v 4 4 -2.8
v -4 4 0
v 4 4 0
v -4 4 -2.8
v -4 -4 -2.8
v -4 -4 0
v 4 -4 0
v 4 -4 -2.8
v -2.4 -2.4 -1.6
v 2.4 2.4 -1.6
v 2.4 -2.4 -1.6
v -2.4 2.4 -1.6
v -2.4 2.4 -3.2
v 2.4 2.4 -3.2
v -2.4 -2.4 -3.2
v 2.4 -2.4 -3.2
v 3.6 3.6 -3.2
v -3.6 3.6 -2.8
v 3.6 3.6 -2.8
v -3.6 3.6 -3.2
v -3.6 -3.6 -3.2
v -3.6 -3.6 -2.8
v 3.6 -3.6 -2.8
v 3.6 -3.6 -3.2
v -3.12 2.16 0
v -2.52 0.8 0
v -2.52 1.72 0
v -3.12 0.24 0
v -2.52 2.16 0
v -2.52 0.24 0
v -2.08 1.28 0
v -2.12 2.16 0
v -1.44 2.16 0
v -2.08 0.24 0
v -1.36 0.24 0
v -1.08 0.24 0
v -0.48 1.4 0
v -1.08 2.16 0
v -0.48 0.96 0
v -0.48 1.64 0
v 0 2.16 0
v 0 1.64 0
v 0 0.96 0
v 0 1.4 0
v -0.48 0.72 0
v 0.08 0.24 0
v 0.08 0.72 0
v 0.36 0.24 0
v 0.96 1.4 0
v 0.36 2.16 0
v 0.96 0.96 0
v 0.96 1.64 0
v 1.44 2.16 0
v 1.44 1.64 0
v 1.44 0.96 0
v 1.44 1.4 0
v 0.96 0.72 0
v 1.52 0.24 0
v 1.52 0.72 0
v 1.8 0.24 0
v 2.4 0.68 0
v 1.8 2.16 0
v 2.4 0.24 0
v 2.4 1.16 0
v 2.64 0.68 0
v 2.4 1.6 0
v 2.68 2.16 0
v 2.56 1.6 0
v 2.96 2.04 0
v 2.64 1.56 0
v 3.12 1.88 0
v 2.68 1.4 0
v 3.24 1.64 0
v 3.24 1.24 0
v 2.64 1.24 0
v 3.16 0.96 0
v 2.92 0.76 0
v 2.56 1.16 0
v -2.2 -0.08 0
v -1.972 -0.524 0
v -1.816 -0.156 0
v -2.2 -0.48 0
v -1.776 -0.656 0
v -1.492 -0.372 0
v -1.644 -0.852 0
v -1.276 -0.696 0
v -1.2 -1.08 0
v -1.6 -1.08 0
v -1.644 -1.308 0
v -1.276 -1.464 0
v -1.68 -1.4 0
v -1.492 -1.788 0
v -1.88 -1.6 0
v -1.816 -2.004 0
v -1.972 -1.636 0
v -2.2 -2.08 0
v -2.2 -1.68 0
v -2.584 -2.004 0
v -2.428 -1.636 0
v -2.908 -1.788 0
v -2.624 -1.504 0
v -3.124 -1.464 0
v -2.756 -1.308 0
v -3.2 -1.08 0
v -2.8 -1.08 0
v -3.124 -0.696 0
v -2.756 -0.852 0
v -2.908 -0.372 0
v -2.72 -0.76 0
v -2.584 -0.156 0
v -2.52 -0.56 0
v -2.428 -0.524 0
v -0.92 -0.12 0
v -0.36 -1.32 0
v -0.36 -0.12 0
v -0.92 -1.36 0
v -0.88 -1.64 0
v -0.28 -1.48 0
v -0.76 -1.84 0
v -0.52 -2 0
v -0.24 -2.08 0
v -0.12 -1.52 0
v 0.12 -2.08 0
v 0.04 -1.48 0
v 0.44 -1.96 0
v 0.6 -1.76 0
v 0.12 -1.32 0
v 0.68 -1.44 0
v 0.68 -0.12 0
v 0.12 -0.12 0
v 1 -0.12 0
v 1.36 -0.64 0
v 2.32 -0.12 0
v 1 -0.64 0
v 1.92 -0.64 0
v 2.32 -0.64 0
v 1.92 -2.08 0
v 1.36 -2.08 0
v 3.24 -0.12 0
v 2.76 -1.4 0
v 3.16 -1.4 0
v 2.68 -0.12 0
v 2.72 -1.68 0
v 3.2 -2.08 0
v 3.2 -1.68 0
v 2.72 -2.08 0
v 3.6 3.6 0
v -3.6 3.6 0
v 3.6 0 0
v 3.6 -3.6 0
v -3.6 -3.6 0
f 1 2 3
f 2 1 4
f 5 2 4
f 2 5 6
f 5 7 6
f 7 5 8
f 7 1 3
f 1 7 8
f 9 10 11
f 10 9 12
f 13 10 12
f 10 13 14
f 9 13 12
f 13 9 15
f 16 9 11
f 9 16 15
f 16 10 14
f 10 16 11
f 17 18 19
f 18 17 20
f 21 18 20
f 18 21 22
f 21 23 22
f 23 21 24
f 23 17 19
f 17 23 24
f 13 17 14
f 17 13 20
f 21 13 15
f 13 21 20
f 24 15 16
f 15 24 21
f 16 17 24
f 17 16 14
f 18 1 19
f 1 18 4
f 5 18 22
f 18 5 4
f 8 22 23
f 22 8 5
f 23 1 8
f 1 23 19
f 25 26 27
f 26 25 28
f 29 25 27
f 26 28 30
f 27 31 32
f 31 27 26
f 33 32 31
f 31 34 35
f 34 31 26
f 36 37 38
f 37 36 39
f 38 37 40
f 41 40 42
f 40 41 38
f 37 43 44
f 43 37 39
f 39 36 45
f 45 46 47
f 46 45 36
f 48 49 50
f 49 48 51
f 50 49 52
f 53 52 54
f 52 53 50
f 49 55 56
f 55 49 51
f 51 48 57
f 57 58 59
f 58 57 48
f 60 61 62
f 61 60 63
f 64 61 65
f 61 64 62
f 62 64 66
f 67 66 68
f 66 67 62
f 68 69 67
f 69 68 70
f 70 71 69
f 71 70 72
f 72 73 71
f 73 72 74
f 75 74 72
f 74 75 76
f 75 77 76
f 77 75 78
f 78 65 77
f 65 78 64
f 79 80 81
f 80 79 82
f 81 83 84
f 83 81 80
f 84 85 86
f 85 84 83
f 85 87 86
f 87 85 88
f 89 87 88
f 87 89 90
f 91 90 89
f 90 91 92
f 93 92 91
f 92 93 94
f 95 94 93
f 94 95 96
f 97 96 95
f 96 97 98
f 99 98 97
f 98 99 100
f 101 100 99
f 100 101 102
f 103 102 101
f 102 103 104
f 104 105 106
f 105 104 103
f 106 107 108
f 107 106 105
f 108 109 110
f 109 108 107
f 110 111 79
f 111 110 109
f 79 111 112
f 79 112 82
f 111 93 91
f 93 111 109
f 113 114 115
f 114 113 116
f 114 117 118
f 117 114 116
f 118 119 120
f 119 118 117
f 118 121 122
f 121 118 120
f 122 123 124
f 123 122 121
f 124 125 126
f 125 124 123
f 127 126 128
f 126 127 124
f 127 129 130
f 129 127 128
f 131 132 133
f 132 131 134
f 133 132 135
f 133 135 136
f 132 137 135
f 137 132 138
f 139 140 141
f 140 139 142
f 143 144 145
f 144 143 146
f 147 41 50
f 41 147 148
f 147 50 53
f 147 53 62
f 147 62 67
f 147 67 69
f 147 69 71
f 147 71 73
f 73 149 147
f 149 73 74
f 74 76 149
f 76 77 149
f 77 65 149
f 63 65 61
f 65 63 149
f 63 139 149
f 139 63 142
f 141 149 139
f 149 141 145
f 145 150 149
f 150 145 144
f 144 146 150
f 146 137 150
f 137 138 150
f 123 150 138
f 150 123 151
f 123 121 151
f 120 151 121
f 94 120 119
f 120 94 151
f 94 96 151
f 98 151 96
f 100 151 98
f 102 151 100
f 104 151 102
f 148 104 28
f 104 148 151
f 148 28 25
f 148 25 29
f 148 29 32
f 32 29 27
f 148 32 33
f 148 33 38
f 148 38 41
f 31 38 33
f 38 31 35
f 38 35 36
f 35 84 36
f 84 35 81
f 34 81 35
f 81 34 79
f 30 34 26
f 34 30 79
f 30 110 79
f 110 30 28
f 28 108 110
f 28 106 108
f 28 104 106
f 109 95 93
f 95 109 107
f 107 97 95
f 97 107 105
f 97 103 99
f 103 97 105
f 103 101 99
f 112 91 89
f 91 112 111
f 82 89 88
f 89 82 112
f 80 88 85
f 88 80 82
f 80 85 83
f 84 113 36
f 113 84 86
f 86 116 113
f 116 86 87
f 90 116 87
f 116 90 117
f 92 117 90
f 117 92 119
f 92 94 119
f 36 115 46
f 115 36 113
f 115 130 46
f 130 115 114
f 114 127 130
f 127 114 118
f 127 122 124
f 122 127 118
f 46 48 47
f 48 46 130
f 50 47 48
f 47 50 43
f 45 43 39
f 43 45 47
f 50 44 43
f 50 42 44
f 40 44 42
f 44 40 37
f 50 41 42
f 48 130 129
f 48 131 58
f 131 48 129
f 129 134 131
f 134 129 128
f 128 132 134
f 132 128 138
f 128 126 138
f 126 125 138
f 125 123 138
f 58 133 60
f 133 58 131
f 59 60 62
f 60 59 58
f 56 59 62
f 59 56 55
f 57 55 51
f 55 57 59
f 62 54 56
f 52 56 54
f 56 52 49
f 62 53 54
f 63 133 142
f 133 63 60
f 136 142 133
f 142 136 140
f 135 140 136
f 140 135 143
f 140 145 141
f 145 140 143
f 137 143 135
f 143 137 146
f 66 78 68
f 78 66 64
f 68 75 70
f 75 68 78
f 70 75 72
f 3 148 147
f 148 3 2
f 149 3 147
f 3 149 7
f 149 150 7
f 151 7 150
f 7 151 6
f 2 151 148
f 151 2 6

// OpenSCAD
// file: ../p/box5.scad
use <../lib.scad>
function ldraw_lib__box5() = [
// 0 Box with 5 Faces and All Edges
// 0 Name: box5.dat
// 0 Author: James Jessiman
// 0 !LDRAW_ORG Primitive UPDATE 2012-01
// 0 !LICENSE Licensed under CC BY 4.0 : see CAreadme.txt
// 
// 0 BFC CERTIFY CCW
  [0,"BFC","CERTIFY"],
  [0,"BFC","CCW"],
// 
// 0 !HISTORY 2002-04-03 [sbliss] Modified for BFC compliance
// 0 !HISTORY 2002-04-25 [PTadmin] Official Update 2002-02
// 0 !HISTORY 2007-06-24 [PTadmin] Header formatted for Contributor Agreement
// 0 !HISTORY 2008-07-01 [PTadmin] Official Update 2008-01
// 0 !HISTORY 2012-02-16 [Philo] Changed to CCW
// 0 !HISTORY 2012-03-30 [PTadmin] Official Update 2012-01
// 
// 
// 2 24 1 1 1 -1 1 1
  [2,24,1,1,1,-1,1,1],
// 2 24 -1 1 1 -1 1 -1
  [2,24,-1,1,1,-1,1,-1],
// 2 24 -1 1 -1 1 1 -1
  [2,24,-1,1,-1,1,1,-1],
// 2 24 1 1 -1 1 1 1
  [2,24,1,1,-1,1,1,1],
// 2 24 1 0 1 -1 0 1
  [2,24,1,0,1,-1,0,1],
// 2 24 -1 0 1 -1 0 -1
  [2,24,-1,0,1,-1,0,-1],
// 2 24 -1 0 -1 1 0 -1
  [2,24,-1,0,-1,1,0,-1],
// 2 24 1 0 -1 1 0 1
  [2,24,1,0,-1,1,0,1],
// 2 24 1 0 1 1 1 1
  [2,24,1,0,1,1,1,1],
// 2 24 -1 0 1 -1 1 1
  [2,24,-1,0,1,-1,1,1],
// 2 24 1 0 -1 1 1 -1
  [2,24,1,0,-1,1,1,-1],
// 2 24 -1 0 -1 -1 1 -1
  [2,24,-1,0,-1,-1,1,-1],
// 4 16 -1 1 1 1 1 1 1 1 -1 -1 1 -1
  [4,16,-1,1,1,1,1,1,1,1,-1,-1,1,-1],
// 4 16 -1 1 1 -1 0 1 1 0 1 1 1 1
  [4,16,-1,1,1,-1,0,1,1,0,1,1,1,1],
// 4 16 -1 1 -1 -1 0 -1 -1 0 1 -1 1 1
  [4,16,-1,1,-1,-1,0,-1,-1,0,1,-1,1,1],
// 4 16 1 1 -1 1 0 -1 -1 0 -1 -1 1 -1
  [4,16,1,1,-1,1,0,-1,-1,0,-1,-1,1,-1],
// 4 16 1 1 1 1 0 1 1 0 -1 1 1 -1
  [4,16,1,1,1,1,0,1,1,0,-1,1,1,-1],
];
module ldraw_lib__box5(step=0, col=false, unit=2/5, alt=false, line=0.2, solid=!$preview)
    makepoly(ldraw_lib__box5(), step=step, col=col, unit=unit, alt=alt, line=line, solid=solid);
ldraw_lib__box5(line=0.2);
// file: ../p/box4.scad
use <../lib.scad>
function ldraw_lib__box4() = [
// 0 Box with 4 Faces (2 Parallel Pairs) and All Edges
// 0 Name: box4.dat
// 0 Author: James Jessiman
// 0 !LDRAW_ORG Primitive UPDATE 2012-01
// 0 !LICENSE Licensed under CC BY 4.0 : see CAreadme.txt
// 
// 0 BFC CERTIFY CCW
  [0,"BFC","CERTIFY"],
  [0,"BFC","CCW"],
// 
// 0 !HISTORY 2002-04-03 [sbliss] Modified for BFC compliance
// 0 !HISTORY 2002-04-25 [PTadmin] Official Update 2002-02
// 0 !HISTORY 2007-06-24 [PTadmin] Header formatted for Contributor Agreement
// 0 !HISTORY 2008-07-01 [PTadmin] Official Update 2008-01
// 0 !HISTORY 2012-02-16 [Philo] Changed to CCW
// 0 !HISTORY 2012-03-30 [PTadmin] Official Update 2012-01
// 
// 
// 2 24 1 1 1 -1 1 1
  [2,24,1,1,1,-1,1,1],
// 2 24 -1 1 1 -1 1 -1
  [2,24,-1,1,1,-1,1,-1],
// 2 24 -1 1 -1 1 1 -1
  [2,24,-1,1,-1,1,1,-1],
// 2 24 1 1 -1 1 1 1
  [2,24,1,1,-1,1,1,1],
// 2 24 1 0 1 -1 0 1
  [2,24,1,0,1,-1,0,1],
// 2 24 -1 0 1 -1 0 -1
  [2,24,-1,0,1,-1,0,-1],
// 2 24 -1 0 -1 1 0 -1
  [2,24,-1,0,-1,1,0,-1],
// 2 24 1 0 -1 1 0 1
  [2,24,1,0,-1,1,0,1],
// 2 24 1 0 1 1 1 1
  [2,24,1,0,1,1,1,1],
// 2 24 -1 0 1 -1 1 1
  [2,24,-1,0,1,-1,1,1],
// 2 24 1 0 -1 1 1 -1
  [2,24,1,0,-1,1,1,-1],
// 2 24 -1 0 -1 -1 1 -1
  [2,24,-1,0,-1,-1,1,-1],
// 4 16 -1 1 1 -1 0 1 1 0 1 1 1 1
  [4,16,-1,1,1,-1,0,1,1,0,1,1,1,1],
// 4 16 -1 1 -1 -1 0 -1 -1 0 1 -1 1 1
  [4,16,-1,1,-1,-1,0,-1,-1,0,1,-1,1,1],
// 4 16 1 1 -1 1 0 -1 -1 0 -1 -1 1 -1
  [4,16,1,1,-1,1,0,-1,-1,0,-1,-1,1,-1],
// 4 16 1 1 1 1 0 1 1 0 -1 1 1 -1
  [4,16,1,1,1,1,0,1,1,0,-1,1,1,-1],
];
module ldraw_lib__box4(step=0, col=false, unit=2/5, alt=false, line=0.2, solid=!$preview)
    makepoly(ldraw_lib__box4(), step=step, col=col, unit=unit, alt=alt, line=line, solid=solid);
ldraw_lib__box4(line=0.2);
// file: s/3070bs01.scad
use <../../lib.scad>
use <../../p/box4.scad>
use <../../p/box5.scad>
function ldraw_lib__s__3070bs01() = [
// 0 ~Tile  1 x  1 with Groove without Top Face
// 0 Name: s\3070bs01.dat
// 0 Author: Chris Dee [cwdee]
// 0 !LDRAW_ORG Subpart UPDATE 2009-02
// 0 !LICENSE Licensed under CC BY 4.0 : see CAreadme.txt
// 
// 0 BFC CERTIFY CCW
  [0,"BFC","CERTIFY"],
  [0,"BFC","CCW"],
// 
// 0 !HISTORY 2009-09-03 [PTadmin] Official Update 2009-02
// 
// 
// 1 16 0 0 0 10 0 0 0 7 0 0 0 10 box4.dat
  [1,16,0,0,0,10,0,0,0,7,0,0,0,10, ldraw_lib__box4()],
// 0 BFC INVERTNEXT
  [0,"BFC","INVERTNEXT"],
// 1 16 0 8 0 6 0 0 0 -4 0 0 0 6 box5.dat
  [1,16,0,8,0,6,0,0,0,-4,0,0,0,6, ldraw_lib__box5()],
// 1 16 0 7 0 9 0 0 0 1 0 0 0 9 box4.dat
  [1,16,0,7,0,9,0,0,0,1,0,0,0,9, ldraw_lib__box4()],
// 
// 4 16 9 8 9 6 8 6 -6 8 6 -9 8 9
  [4,16,9,8,9,6,8,6,-6,8,6,-9,8,9],
// 4 16 -9 8 9 -6 8 6 -6 8 -6 -9 8 -9
  [4,16,-9,8,9,-6,8,6,-6,8,-6,-9,8,-9],
// 4 16 -9 8 -9 -6 8 -6 6 8 -6 9 8 -9
  [4,16,-9,8,-9,-6,8,-6,6,8,-6,9,8,-9],
// 4 16 9 8 -9 6 8 -6 6 8 6 9 8 9
  [4,16,9,8,-9,6,8,-6,6,8,6,9,8,9],
// 
// 4 16 10 7 10 9 7 9 -9 7 9 -10 7 10
  [4,16,10,7,10,9,7,9,-9,7,9,-10,7,10],
// 4 16 -10 7 10 -9 7 9 -9 7 -9 -10 7 -10
  [4,16,-10,7,10,-9,7,9,-9,7,-9,-10,7,-10],
// 4 16 -10 7 -10 -9 7 -9 9 7 -9 10 7 -10
  [4,16,-10,7,-10,-9,7,-9,9,7,-9,10,7,-10],
// 4 16 10 7 -10 9 7 -9 9 7 9 10 7 10
  [4,16,10,7,-10,9,7,-9,9,7,9,10,7,10],
// 0
];
module ldraw_lib__s__3070bs01(step=0, col=false, unit=2/5, alt=false, line=0.2, solid=!$preview)
    makepoly(ldraw_lib__s__3070bs01(), step=step, col=col, unit=unit, alt=alt, line=line, solid=solid);
ldraw_lib__s__3070bs01(line=0.2);
// main file
use <../lib.scad>
use <s/3070bs01.scad>
function ldraw_lib__3070bpt3() = [
// 0 Tile  1 x  1 with Bright Pink "KEEP OUT!" on Magenta Background Pattern
// 0 Name: 3070bpt3.dat
// 0 Author: Takeshi Takahashi [RainbowDolphin]
// 0 !LDRAW_ORG Part UPDATE 2025-11
// 0 !LICENSE Licensed under CC BY 4.0 : see CAreadme.txt
// 
// 0 BFC CERTIFY CCW
  [0,"BFC","CERTIFY"],
  [0,"BFC","CCW"],
// 
// 0 !KEYWORDS BrickLink 3070pb185, Brickowl 282991, Dots, Extra
// 0 !KEYWORDS Rebrickable 3070bpr9980, Series 3, Set 41921
// 
// 0 !HISTORY 2025-11-30 [OrionP] Official Update 2025-11
// 
// 1 16 0 0 0 1 0 0 0 1 0 0 0 1 s\3070bs01.dat
  [1,16,0,0,0,1,0,0,0,1,0,0,0,1, ldraw_lib__s__3070bs01()],
// 4 29 -7.8 0 5.4 -7.8 0 0.6 -6.3 0 2 -6.3 0 4.3
  [4,29,-7.8,0,5.4,-7.8,0,0.6,-6.3,0,2,-6.3,0,4.3],
// 3 29 -6.3 0 5.4 -7.8 0 5.4 -6.3 0 4.3
  [3,29,-6.3,0,5.4,-7.8,0,5.4,-6.3,0,4.3],
// 3 29 -6.3 0 2 -7.8 0 0.6 -6.3 0 0.6
  [3,29,-6.3,0,2,-7.8,0,0.6,-6.3,0,0.6],
// 4 29 -6.3 0 4.3 -6.3 0 2 -5.2 0 3.2 -5.3 0 5.4
  [4,29,-6.3,0,4.3,-6.3,0,2,-5.2,0,3.2,-5.3,0,5.4],
// 3 29 -3.6 0 5.4 -5.3 0 5.4 -5.2 0 3.2
  [3,29,-3.6,0,5.4,-5.3,0,5.4,-5.2,0,3.2],
// 4 29 -5.2 0 3.2 -6.3 0 2 -5.2 0 0.6 -3.4 0 0.6
  [4,29,-5.2,0,3.2,-6.3,0,2,-5.2,0,0.6,-3.4,0,0.6],
// 4 29 -2.7 0 5.4 -2.7 0 0.6 -1.2 0 2.4 -1.2 0 3.5
  [4,29,-2.7,0,5.4,-2.7,0,0.6,-1.2,0,2.4,-1.2,0,3.5],
// 3 29 -2.7 0 5.4 -1.2 0 3.5 -1.2 0 4.1
  [3,29,-2.7,0,5.4,-1.2,0,3.5,-1.2,0,4.1],
// 4 29 0 0 5.4 -2.7 0 5.4 -1.2 0 4.1 0 0 4.1
  [4,29,0,0,5.4,-2.7,0,5.4,-1.2,0,4.1,0,0,4.1],
// 4 29 0 0 3.5 -1.2 0 3.5 -1.2 0 2.4 0 0 2.4
  [4,29,0,0,3.5,-1.2,0,3.5,-1.2,0,2.4,0,0,2.4],
// 3 29 -1.2 0 2.4 -2.7 0 0.6 -1.2 0 1.8
  [3,29,-1.2,0,2.4,-2.7,0,0.6,-1.2,0,1.8],
// 4 29 -1.2 0 1.8 -2.7 0 0.6 0.2 0 0.6 0.2 0 1.8
  [4,29,-1.2,0,1.8,-2.7,0,0.6,0.2,0,0.6,0.2,0,1.8],
// 4 29 0.9 0 5.4 0.9 0 0.6 2.4 0 2.4 2.4 0 3.5
  [4,29,0.9,0,5.4,0.9,0,0.6,2.4,0,2.4,2.4,0,3.5],
// 3 29 0.9 0 5.4 2.4 0 3.5 2.4 0 4.1
  [3,29,0.9,0,5.4,2.4,0,3.5,2.4,0,4.1],
// 4 29 3.6 0 5.4 0.9 0 5.4 2.4 0 4.1 3.6 0 4.1
  [4,29,3.6,0,5.4,0.9,0,5.4,2.4,0,4.1,3.6,0,4.1],
// 4 29 3.6 0 3.5 2.4 0 3.5 2.4 0 2.4 3.6 0 2.4
  [4,29,3.6,0,3.5,2.4,0,3.5,2.4,0,2.4,3.6,0,2.4],
// 3 29 2.4 0 2.4 0.9 0 0.6 2.4 0 1.8
  [3,29,2.4,0,2.4,0.9,0,0.6,2.4,0,1.8],
// 4 29 2.4 0 1.8 0.9 0 0.6 3.8 0 0.6 3.8 0 1.8
  [4,29,2.4,0,1.8,0.9,0,0.6,3.8,0,0.6,3.8,0,1.8],
// 4 29 6 0 1.7 4.5 0 5.4 4.5 0 0.6 6 0 0.6
  [4,29,6,0,1.7,4.5,0,5.4,4.5,0,0.6,6,0,0.6],
// 4 29 6 0 2.9 4.5 0 5.4 6 0 1.7 6.6 0 1.7
  [4,29,6,0,2.9,4.5,0,5.4,6,0,1.7,6.6,0,1.7],
// 3 29 4.5 0 5.4 6 0 2.9 6 0 4
  [3,29,4.5,0,5.4,6,0,2.9,6,0,4],
// 4 29 6.7 0 5.4 4.5 0 5.4 6 0 4 6.4 0 4
  [4,29,6.7,0,5.4,4.5,0,5.4,6,0,4,6.4,0,4],
// 4 29 7.4 0 5.1 6.7 0 5.4 6.4 0 4 6.6 0 3.9
  [4,29,7.4,0,5.1,6.7,0,5.4,6.4,0,4,6.6,0,3.9],
// 4 29 7.8 0 4.7 7.4 0 5.1 6.6 0 3.9 6.7 0 3.5
  [4,29,7.8,0,4.7,7.4,0,5.1,6.6,0,3.9,6.7,0,3.5],
// 4 29 8.1 0 4.1 7.8 0 4.7 6.7 0 3.5 8.1 0 3.1
  [4,29,8.1,0,4.1,7.8,0,4.7,6.7,0,3.5,8.1,0,3.1],
// 4 29 8.1 0 3.1 6.7 0 3.5 6.6 0 3.1 7.9 0 2.4
  [4,29,8.1,0,3.1,6.7,0,3.5,6.6,0,3.1,7.9,0,2.4],
// 4 29 7.9 0 2.4 6.6 0 3.1 6.4 0 2.9 7.3 0 1.9
  [4,29,7.9,0,2.4,6.6,0,3.1,6.4,0,2.9,7.3,0,1.9],
// 4 29 6.6 0 1.7 7.3 0 1.9 6.4 0 2.9 6 0 2.9
  [4,29,6.6,0,1.7,7.3,0,1.9,6.4,0,2.9,6,0,2.9],
// 4 29 -4.54 0 -0.39 -5.5 0 -0.2 -5.5 0 -1.2 -4.93 0 -1.31
  [4,29,-4.54,0,-0.39,-5.5,0,-0.2,-5.5,0,-1.2,-4.93,0,-1.31],
// 4 29 -3.73 0 -0.93 -4.54 0 -0.39 -4.93 0 -1.31 -4.44 0 -1.64
  [4,29,-3.73,0,-0.93,-4.54,0,-0.39,-4.93,0,-1.31,-4.44,0,-1.64],
// 4 29 -3.19 0 -1.74 -3.73 0 -0.93 -4.44 0 -1.64 -4.11 0 -2.13
  [4,29,-3.19,0,-1.74,-3.73,0,-0.93,-4.44,0,-1.64,-4.11,0,-2.13],
// 4 29 -3 0 -2.7 -3.19 0 -1.74 -4.11 0 -2.13 -4 0 -2.7
  [4,29,-3,0,-2.7,-3.19,0,-1.74,-4.11,0,-2.13,-4,0,-2.7],
// 4 29 -3.19 0 -3.66 -3 0 -2.7 -4 0 -2.7 -4.11 0 -3.27
  [4,29,-3.19,0,-3.66,-3,0,-2.7,-4,0,-2.7,-4.11,0,-3.27],
// 4 29 -3.73 0 -4.47 -3.19 0 -3.66 -4.11 0 -3.27 -4.2 0 -3.5
  [4,29,-3.73,0,-4.47,-3.19,0,-3.66,-4.11,0,-3.27,-4.2,0,-3.5],
// 4 29 -4.54 0 -5.01 -3.73 0 -4.47 -4.2 0 -3.5 -4.7 0 -4
  [4,29,-4.54,0,-5.01,-3.73,0,-4.47,-4.2,0,-3.5,-4.7,0,-4],
// 4 29 -5.5 0 -5.2 -4.54 0 -5.01 -4.7 0 -4 -4.93 0 -4.09
  [4,29,-5.5,0,-5.2,-4.54,0,-5.01,-4.7,0,-4,-4.93,0,-4.09],
// 4 29 -5.5 0 -5.2 -4.93 0 -4.09 -5.5 0 -4.2 -6.46 0 -5.01
  [4,29,-5.5,0,-5.2,-4.93,0,-4.09,-5.5,0,-4.2,-6.46,0,-5.01],
// 4 29 -6.46 0 -5.01 -5.5 0 -4.2 -6.07 0 -4.09 -7.27 0 -4.47
  [4,29,-6.46,0,-5.01,-5.5,0,-4.2,-6.07,0,-4.09,-7.27,0,-4.47],
// 4 29 -7.27 0 -4.47 -6.07 0 -4.09 -6.56 0 -3.76 -7.81 0 -3.66
  [4,29,-7.27,0,-4.47,-6.07,0,-4.09,-6.56,0,-3.76,-7.81,0,-3.66],
// 4 29 -7.81 0 -3.66 -6.56 0 -3.76 -6.89 0 -3.27 -8 0 -2.7
  [4,29,-7.81,0,-3.66,-6.56,0,-3.76,-6.89,0,-3.27,-8,0,-2.7],
// 4 29 -8 0 -2.7 -6.89 0 -3.27 -7 0 -2.7 -7.81 0 -1.74
  [4,29,-8,0,-2.7,-6.89,0,-3.27,-7,0,-2.7,-7.81,0,-1.74],
// 4 29 -7.81 0 -1.74 -7 0 -2.7 -6.89 0 -2.13 -7.27 0 -0.93
  [4,29,-7.81,0,-1.74,-7,0,-2.7,-6.89,0,-2.13,-7.27,0,-0.93],
// 4 29 -7.27 0 -0.93 -6.89 0 -2.13 -6.8 0 -1.9 -6.46 0 -0.39
  [4,29,-7.27,0,-0.93,-6.89,0,-2.13,-6.8,0,-1.9,-6.46,0,-0.39],
// 4 29 -6.46 0 -0.39 -6.8 0 -1.9 -6.3 0 -1.4 -5.5 0 -0.2
  [4,29,-6.46,0,-0.39,-6.8,0,-1.9,-6.3,0,-1.4,-5.5,0,-0.2],
// 3 29 -5.5 0 -0.2 -6.3 0 -1.4 -6.07 0 -1.31
  [3,29,-5.5,0,-0.2,-6.3,0,-1.4,-6.07,0,-1.31],
// 3 29 -5.5 0 -0.2 -6.07 0 -1.31 -5.5 0 -1.2
  [3,29,-5.5,0,-0.2,-6.07,0,-1.31,-5.5,0,-1.2],
// 4 29 -4.2 0 -3.5 -6.3 0 -1.4 -6.8 0 -1.9 -4.7 0 -4
  [4,29,-4.2,0,-3.5,-6.3,0,-1.4,-6.8,0,-1.9,-4.7,0,-4],
// 4 29 -0.9 0 -3.3 -0.9 0 -0.3 -2.3 0 -0.3 -2.3 0 -3.4
  [4,29,-0.9,0,-3.3,-0.9,0,-0.3,-2.3,0,-0.3,-2.3,0,-3.4],
// 4 29 -0.9 0 -3.3 -2.3 0 -3.4 -2.2 0 -4.1 -0.7 0 -3.7
  [4,29,-0.9,0,-3.3,-2.3,0,-3.4,-2.2,0,-4.1,-0.7,0,-3.7],
// 4 29 -0.7 0 -3.7 -2.2 0 -4.1 -1.9 0 -4.6 -1.3 0 -5
  [4,29,-0.7,0,-3.7,-2.2,0,-4.1,-1.9,0,-4.6,-1.3,0,-5],
// 4 29 -0.3 0 -3.8 -0.7 0 -3.7 -1.3 0 -5 -0.6 0 -5.2
  [4,29,-0.3,0,-3.8,-0.7,0,-3.7,-1.3,0,-5,-0.6,0,-5.2],
// 4 29 -0.3 0 -3.8 -0.6 0 -5.2 0.3 0 -5.2 0.1 0 -3.7
  [4,29,-0.3,0,-3.8,-0.6,0,-5.2,0.3,0,-5.2,0.1,0,-3.7],
// 4 29 0.1 0 -3.7 0.3 0 -5.2 1.1 0 -4.9 1.5 0 -4.4
  [4,29,0.1,0,-3.7,0.3,0,-5.2,1.1,0,-4.9,1.5,0,-4.4],
// 4 29 0.3 0 -3.3 0.1 0 -3.7 1.5 0 -4.4 1.7 0 -3.6
  [4,29,0.3,0,-3.3,0.1,0,-3.7,1.5,0,-4.4,1.7,0,-3.6],
// 4 29 0.3 0 -3.3 1.7 0 -3.6 1.7 0 -0.3 0.3 0 -0.3
  [4,29,0.3,0,-3.3,1.7,0,-3.6,1.7,0,-0.3,0.3,0,-0.3],
// 4 29 3.4 0 -1.6 5.8 0 -0.3 2.5 0 -0.3 2.5 0 -1.6
  [4,29,3.4,0,-1.6,5.8,0,-0.3,2.5,0,-0.3,2.5,0,-1.6],
// 3 29 5.8 0 -0.3 3.4 0 -1.6 4.8 0 -1.6
  [3,29,5.8,0,-0.3,3.4,0,-1.6,4.8,0,-1.6],
// 3 29 5.8 0 -0.3 4.8 0 -1.6 5.8 0 -1.6
  [3,29,5.8,0,-0.3,4.8,0,-1.6,5.8,0,-1.6],
// 4 29 4.8 0 -1.6 3.4 0 -1.6 3.4 0 -5.2 4.8 0 -5.2
  [4,29,4.8,0,-1.6,3.4,0,-1.6,3.4,0,-5.2,4.8,0,-5.2],
// 4 29 8.1 0 -0.3 6.7 0 -0.3 6.9 0 -3.5 7.9 0 -3.5
  [4,29,8.1,0,-0.3,6.7,0,-0.3,6.9,0,-3.5,7.9,0,-3.5],
// 4 29 8 0 -4.2 6.8 0 -4.2 6.8 0 -5.2 8 0 -5.2
  [4,29,8,0,-4.2,6.8,0,-4.2,6.8,0,-5.2,8,0,-5.2],
// 4 26 9 0 9 -9 0 9 0 0 5.4 0.9 0 5.4
  [4,26,9,0,9,-9,0,9,0,0,5.4,0.9,0,5.4],
// 3 26 9 0 9 0.9 0 5.4 3.6 0 5.4
  [3,26,9,0,9,0.9,0,5.4,3.6,0,5.4],
// 3 26 9 0 9 3.6 0 5.4 4.5 0 5.4
  [3,26,9,0,9,3.6,0,5.4,4.5,0,5.4],
// 3 26 9 0 9 4.5 0 5.4 6.7 0 5.4
  [3,26,9,0,9,4.5,0,5.4,6.7,0,5.4],
// 3 26 9 0 9 6.7 0 5.4 7.4 0 5.1
  [3,26,9,0,9,6.7,0,5.4,7.4,0,5.1],
// 3 26 9 0 9 7.4 0 5.1 7.8 0 4.7
  [3,26,9,0,9,7.4,0,5.1,7.8,0,4.7],
// 3 26 9 0 9 7.8 0 4.7 8.1 0 4.1
  [3,26,9,0,9,7.8,0,4.7,8.1,0,4.1],
// 4 26 9 0 9 8.1 0 4.1 8.1 0 3.1 9 0 0
  [4,26,9,0,9,8.1,0,4.1,8.1,0,3.1,9,0,0],
// 3 26 8.1 0 3.1 7.9 0 2.4 9 0 0
  [3,26,8.1,0,3.1,7.9,0,2.4,9,0,0],
// 3 26 7.9 0 2.4 7.3 0 1.9 9 0 0
  [3,26,7.9,0,2.4,7.3,0,1.9,9,0,0],
// 3 26 7.3 0 1.9 6.6 0 1.7 9 0 0
  [3,26,7.3,0,1.9,6.6,0,1.7,9,0,0],
// 4 26 9 0 0 6.6 0 1.7 6 0 1.7 6 0 0.6
  [4,26,9,0,0,6.6,0,1.7,6,0,1.7,6,0,0.6],
// 4 26 8.1 0 -0.3 9 0 0 6 0 0.6 6.7 0 -0.3
  [4,26,8.1,0,-0.3,9,0,0,6,0,0.6,6.7,0,-0.3],
// 4 26 9 0 0 8.1 0 -0.3 7.9 0 -3.5 8 0 -4.2
  [4,26,9,0,0,8.1,0,-0.3,7.9,0,-3.5,8,0,-4.2],
// 4 26 9 0 0 8 0 -4.2 8 0 -5.2 9 0 -9
  [4,26,9,0,0,8,0,-4.2,8,0,-5.2,9,0,-9],
// 3 26 8 0 -5.2 6.8 0 -5.2 9 0 -9
  [3,26,8,0,-5.2,6.8,0,-5.2,9,0,-9],
// 3 26 6.8 0 -5.2 4.8 0 -5.2 9 0 -9
  [3,26,6.8,0,-5.2,4.8,0,-5.2,9,0,-9],
// 3 26 4.8 0 -5.2 3.4 0 -5.2 9 0 -9
  [3,26,4.8,0,-5.2,3.4,0,-5.2,9,0,-9],
// 4 26 9 0 -9 3.4 0 -5.2 0.3 0 -5.2 -9 0 -9
  [4,26,9,0,-9,3.4,0,-5.2,0.3,0,-5.2,-9,0,-9],
// 3 26 0.3 0 -5.2 -0.6 0 -5.2 -9 0 -9
  [3,26,0.3,0,-5.2,-0.6,0,-5.2,-9,0,-9],
// 3 26 -1.3 0 -5 -9 0 -9 -0.6 0 -5.2
  [3,26,-1.3,0,-5,-9,0,-9,-0.6,0,-5.2],
// 4 26 -9 0 -9 -1.3 0 -5 -1.9 0 -4.6 -4.54 0 -5.01
  [4,26,-9,0,-9,-1.3,0,-5,-1.9,0,-4.6,-4.54,0,-5.01],
// 3 26 -4.54 0 -5.01 -5.5 0 -5.2 -9 0 -9
  [3,26,-4.54,0,-5.01,-5.5,0,-5.2,-9,0,-9],
// 3 26 -6.46 0 -5.01 -9 0 -9 -5.5 0 -5.2
  [3,26,-6.46,0,-5.01,-9,0,-9,-5.5,0,-5.2],
// 3 26 -7.27 0 -4.47 -9 0 -9 -6.46 0 -5.01
  [3,26,-7.27,0,-4.47,-9,0,-9,-6.46,0,-5.01],
// 3 26 -7.81 0 -3.66 -9 0 -9 -7.27 0 -4.47
  [3,26,-7.81,0,-3.66,-9,0,-9,-7.27,0,-4.47],
// 3 26 -8 0 -2.7 -9 0 -9 -7.81 0 -3.66
  [3,26,-8,0,-2.7,-9,0,-9,-7.81,0,-3.66],
// 4 26 -9 0 -9 -8 0 -2.7 -7.8 0 0.6 -9 0 9
  [4,26,-9,0,-9,-8,0,-2.7,-7.8,0,0.6,-9,0,9],
// 3 26 -9 0 9 -7.8 0 0.6 -7.8 0 5.4
  [3,26,-9,0,9,-7.8,0,0.6,-7.8,0,5.4],
// 3 26 -9 0 9 -7.8 0 5.4 -6.3 0 5.4
  [3,26,-9,0,9,-7.8,0,5.4,-6.3,0,5.4],
// 3 26 -9 0 9 -6.3 0 5.4 -5.3 0 5.4
  [3,26,-9,0,9,-6.3,0,5.4,-5.3,0,5.4],
// 3 26 -5.3 0 5.4 -6.3 0 5.4 -6.3 0 4.3
  [3,26,-5.3,0,5.4,-6.3,0,5.4,-6.3,0,4.3],
// 3 26 -9 0 9 -5.3 0 5.4 -3.6 0 5.4
  [3,26,-9,0,9,-5.3,0,5.4,-3.6,0,5.4],
// 3 26 -9 0 9 -3.6 0 5.4 -2.7 0 5.4
  [3,26,-9,0,9,-3.6,0,5.4,-2.7,0,5.4],
// 3 26 -9 0 9 -2.7 0 5.4 0 0 5.4
  [3,26,-9,0,9,-2.7,0,5.4,0,0,5.4],
// 4 26 -2.7 0 5.4 -3.6 0 5.4 -5.2 0 3.2 -3.4 0 0.6
  [4,26,-2.7,0,5.4,-3.6,0,5.4,-5.2,0,3.2,-3.4,0,0.6],
// 3 26 -2.7 0 5.4 -3.4 0 0.6 -2.7 0 0.6
  [3,26,-2.7,0,5.4,-3.4,0,0.6,-2.7,0,0.6],
// 4 26 -3.73 0 -0.93 -2.7 0 0.6 -3.4 0 0.6 -4.54 0 -0.39
  [4,26,-3.73,0,-0.93,-2.7,0,0.6,-3.4,0,0.6,-4.54,0,-0.39],
// 4 26 -4.54 0 -0.39 -3.4 0 0.6 -5.2 0 0.6 -5.5 0 -0.2
  [4,26,-4.54,0,-0.39,-3.4,0,0.6,-5.2,0,0.6,-5.5,0,-0.2],
// 4 26 -6.3 0 0.6 -5.5 0 -0.2 -5.2 0 0.6 -6.3 0 2
  [4,26,-6.3,0,0.6,-5.5,0,-0.2,-5.2,0,0.6,-6.3,0,2],
// 4 26 -6.46 0 -0.39 -5.5 0 -0.2 -6.3 0 0.6 -7.8 0 0.6
  [4,26,-6.46,0,-0.39,-5.5,0,-0.2,-6.3,0,0.6,-7.8,0,0.6],
// 3 26 -7.8 0 0.6 -7.27 0 -0.93 -6.46 0 -0.39
  [3,26,-7.8,0,0.6,-7.27,0,-0.93,-6.46,0,-0.39],
// 3 26 -7.8 0 0.6 -7.81 0 -1.74 -7.27 0 -0.93
  [3,26,-7.8,0,0.6,-7.81,0,-1.74,-7.27,0,-0.93],
// 3 26 -7.8 0 0.6 -8 0 -2.7 -7.81 0 -1.74
  [3,26,-7.8,0,0.6,-8,0,-2.7,-7.81,0,-1.74],
// 4 26 -4.7 0 -4 -6.8 0 -1.9 -6.89 0 -2.13 -4.93 0 -4.09
  [4,26,-4.7,0,-4,-6.8,0,-1.9,-6.89,0,-2.13,-4.93,0,-4.09],
// 4 26 -4.93 0 -4.09 -6.89 0 -2.13 -7 0 -2.7 -5.5 0 -4.2
  [4,26,-4.93,0,-4.09,-6.89,0,-2.13,-7,0,-2.7,-5.5,0,-4.2],
// 4 26 -5.5 0 -4.2 -7 0 -2.7 -6.89 0 -3.27 -6.07 0 -4.09
  [4,26,-5.5,0,-4.2,-7,0,-2.7,-6.89,0,-3.27,-6.07,0,-4.09],
// 3 26 -6.89 0 -3.27 -6.56 0 -3.76 -6.07 0 -4.09
  [3,26,-6.89,0,-3.27,-6.56,0,-3.76,-6.07,0,-4.09],
// 4 26 -6.3 0 -1.4 -4.2 0 -3.5 -4.11 0 -3.27 -6.07 0 -1.31
  [4,26,-6.3,0,-1.4,-4.2,0,-3.5,-4.11,0,-3.27,-6.07,0,-1.31],
// 4 26 -6.07 0 -1.31 -4.11 0 -3.27 -4 0 -2.7 -5.5 0 -1.2
  [4,26,-6.07,0,-1.31,-4.11,0,-3.27,-4,0,-2.7,-5.5,0,-1.2],
// 4 26 -5.5 0 -1.2 -4 0 -2.7 -4.11 0 -2.13 -4.93 0 -1.31
  [4,26,-5.5,0,-1.2,-4,0,-2.7,-4.11,0,-2.13,-4.93,0,-1.31],
// 3 26 -4.93 0 -1.31 -4.11 0 -2.13 -4.44 0 -1.64
  [3,26,-4.93,0,-1.31,-4.11,0,-2.13,-4.44,0,-1.64],
// 4 26 -2.3 0 -0.3 -2.7 0 0.6 -3.73 0 -0.93 -3.19 0 -1.74
  [4,26,-2.3,0,-0.3,-2.7,0,0.6,-3.73,0,-0.93,-3.19,0,-1.74],
// 4 26 -2.3 0 -0.3 -3.19 0 -1.74 -3 0 -2.7 -2.3 0 -3.4
  [4,26,-2.3,0,-0.3,-3.19,0,-1.74,-3,0,-2.7,-2.3,0,-3.4],
// 4 26 -2.3 0 -3.4 -3 0 -2.7 -3.19 0 -3.66 -2.2 0 -4.1
  [4,26,-2.3,0,-3.4,-3,0,-2.7,-3.19,0,-3.66,-2.2,0,-4.1],
// 4 26 -2.2 0 -4.1 -3.19 0 -3.66 -3.73 0 -4.47 -1.9 0 -4.6
  [4,26,-2.2,0,-4.1,-3.19,0,-3.66,-3.73,0,-4.47,-1.9,0,-4.6],
// 3 26 -3.73 0 -4.47 -4.54 0 -5.01 -1.9 0 -4.6
  [3,26,-3.73,0,-4.47,-4.54,0,-5.01,-1.9,0,-4.6],
// 4 26 -2.7 0 0.6 -2.3 0 -0.3 -0.9 0 -0.3 0.2 0 0.6
  [4,26,-2.7,0,0.6,-2.3,0,-0.3,-0.9,0,-0.3,0.2,0,0.6],
// 4 26 0.3 0 -0.3 0.2 0 0.6 -0.9 0 -0.3 -0.9 0 -3.3
  [4,26,0.3,0,-0.3,0.2,0,0.6,-0.9,0,-0.3,-0.9,0,-3.3],
// 4 26 0.3 0 -3.3 0.3 0 -0.3 -0.9 0 -3.3 -0.7 0 -3.7
  [4,26,0.3,0,-3.3,0.3,0,-0.3,-0.9,0,-3.3,-0.7,0,-3.7],
// 4 26 0.1 0 -3.7 0.3 0 -3.3 -0.7 0 -3.7 -0.3 0 -3.8
  [4,26,0.1,0,-3.7,0.3,0,-3.3,-0.7,0,-3.7,-0.3,0,-3.8],
// 4 26 0.2 0 0.6 0.3 0 -0.3 0.9 0 0.6 0.2 0 1.8
  [4,26,0.2,0,0.6,0.3,0,-0.3,0.9,0,0.6,0.2,0,1.8],
// 4 26 0.2 0 1.8 0.9 0 0.6 0.9 0 5.4 0 0 2.4
  [4,26,0.2,0,1.8,0.9,0,0.6,0.9,0,5.4,0,0,2.4],
// 4 26 -1.2 0 1.8 0.2 0 1.8 0 0 2.4 -1.2 0 2.4
  [4,26,-1.2,0,1.8,0.2,0,1.8,0,0,2.4,-1.2,0,2.4],
// 3 26 0.9 0 5.4 0 0 3.5 0 0 2.4
  [3,26,0.9,0,5.4,0,0,3.5,0,0,2.4],
// 3 26 0.9 0 5.4 0 0 4.1 0 0 3.5
  [3,26,0.9,0,5.4,0,0,4.1,0,0,3.5],
// 4 26 -1.2 0 3.5 0 0 3.5 0 0 4.1 -1.2 0 4.1
  [4,26,-1.2,0,3.5,0,0,3.5,0,0,4.1,-1.2,0,4.1],
// 3 26 0.9 0 5.4 0 0 5.4 0 0 4.1
  [3,26,0.9,0,5.4,0,0,5.4,0,0,4.1],
// 3 26 0.9 0 0.6 0.3 0 -0.3 1.7 0 -0.3
  [3,26,0.9,0,0.6,0.3,0,-0.3,1.7,0,-0.3],
// 4 26 0.9 0 0.6 1.7 0 -0.3 2.5 0 -0.3 3.8 0 0.6
  [4,26,0.9,0,0.6,1.7,0,-0.3,2.5,0,-0.3,3.8,0,0.6],
// 4 26 2.5 0 -1.6 2.5 0 -0.3 1.7 0 -0.3 1.7 0 -3.6
  [4,26,2.5,0,-1.6,2.5,0,-0.3,1.7,0,-0.3,1.7,0,-3.6],
// 4 26 2.5 0 -1.6 1.7 0 -3.6 3.4 0 -5.2 3.4 0 -1.6
  [4,26,2.5,0,-1.6,1.7,0,-3.6,3.4,0,-5.2,3.4,0,-1.6],
// 3 26 1.7 0 -3.6 1.5 0 -4.4 3.4 0 -5.2
  [3,26,1.7,0,-3.6,1.5,0,-4.4,3.4,0,-5.2],
// 3 26 1.5 0 -4.4 1.1 0 -4.9 3.4 0 -5.2
  [3,26,1.5,0,-4.4,1.1,0,-4.9,3.4,0,-5.2],
// 3 26 1.1 0 -4.9 0.3 0 -5.2 3.4 0 -5.2
  [3,26,1.1,0,-4.9,0.3,0,-5.2,3.4,0,-5.2],
// 4 26 4.5 0 0.6 3.8 0 0.6 2.5 0 -0.3 5.8 0 -0.3
  [4,26,4.5,0,0.6,3.8,0,0.6,2.5,0,-0.3,5.8,0,-0.3],
// 4 26 3.8 0 1.8 3.8 0 0.6 4.5 0 0.6 4.5 0 5.4
  [4,26,3.8,0,1.8,3.8,0,0.6,4.5,0,0.6,4.5,0,5.4],
// 4 26 3.6 0 2.4 3.8 0 1.8 4.5 0 5.4 3.6 0 3.5
  [4,26,3.6,0,2.4,3.8,0,1.8,4.5,0,5.4,3.6,0,3.5],
// 4 26 2.4 0 1.8 3.8 0 1.8 3.6 0 2.4 2.4 0 2.4
  [4,26,2.4,0,1.8,3.8,0,1.8,3.6,0,2.4,2.4,0,2.4],
// 3 26 4.5 0 5.4 3.6 0 4.1 3.6 0 3.5
  [3,26,4.5,0,5.4,3.6,0,4.1,3.6,0,3.5],
// 4 26 2.4 0 3.5 3.6 0 3.5 3.6 0 4.1 2.4 0 4.1
  [4,26,2.4,0,3.5,3.6,0,3.5,3.6,0,4.1,2.4,0,4.1],
// 3 26 4.5 0 5.4 3.6 0 5.4 3.6 0 4.1
  [3,26,4.5,0,5.4,3.6,0,5.4,3.6,0,4.1],
// 4 26 6 0 0.6 4.5 0 0.6 5.8 0 -0.3 6.7 0 -0.3
  [4,26,6,0,0.6,4.5,0,0.6,5.8,0,-0.3,6.7,0,-0.3],
// 4 26 6.7 0 -0.3 5.8 0 -0.3 5.8 0 -1.6 6.9 0 -3.5
  [4,26,6.7,0,-0.3,5.8,0,-0.3,5.8,0,-1.6,6.9,0,-3.5],
// 4 26 6.8 0 -4.2 6.9 0 -3.5 5.8 0 -1.6 4.8 0 -1.6
  [4,26,6.8,0,-4.2,6.9,0,-3.5,5.8,0,-1.6,4.8,0,-1.6],
// 4 26 6.9 0 -3.5 6.8 0 -4.2 8 0 -4.2 7.9 0 -3.5
  [4,26,6.9,0,-3.5,6.8,0,-4.2,8,0,-4.2,7.9,0,-3.5],
// 4 26 6.8 0 -5.2 6.8 0 -4.2 4.8 0 -1.6 4.8 0 -5.2
  [4,26,6.8,0,-5.2,6.8,0,-4.2,4.8,0,-1.6,4.8,0,-5.2],
// 4 26 6 0 4 6 0 2.9 6.4 0 2.9 6.4 0 4
  [4,26,6,0,4,6,0,2.9,6.4,0,2.9,6.4,0,4],
// 4 26 6.4 0 4 6.4 0 2.9 6.6 0 3.1 6.6 0 3.9
  [4,26,6.4,0,4,6.4,0,2.9,6.6,0,3.1,6.6,0,3.9],
// 3 26 6.6 0 3.9 6.6 0 3.1 6.7 0 3.5
  [3,26,6.6,0,3.9,6.6,0,3.1,6.7,0,3.5],
// 4 16 10 0 10 -10 0 10 -9 0 9 9 0 9
  [4,16,10,0,10,-10,0,10,-9,0,9,9,0,9],
// 4 16 9 0 9 9 0 0 10 0 -10 10 0 10
  [4,16,9,0,9,9,0,0,10,0,-10,10,0,10],
// 3 16 9 0 0 9 0 -9 10 0 -10
  [3,16,9,0,0,9,0,-9,10,0,-10],
// 4 16 -10 0 -10 10 0 -10 9 0 -9 -9 0 -9
  [4,16,-10,0,-10,10,0,-10,9,0,-9,-9,0,-9],
// 4 16 -10 0 10 -10 0 -10 -9 0 -9 -9 0 9
  [4,16,-10,0,10,-10,0,-10,-9,0,-9,-9,0,9],
];
module ldraw_lib__3070bpt3(step=0, col=false, unit=2/5, alt=false, line=0.2, solid=!$preview)
    makepoly(ldraw_lib__3070bpt3(), step=step, col=col, unit=unit, alt=alt, line=line, solid=solid);
ldraw_lib__3070bpt3(line=0.2);
